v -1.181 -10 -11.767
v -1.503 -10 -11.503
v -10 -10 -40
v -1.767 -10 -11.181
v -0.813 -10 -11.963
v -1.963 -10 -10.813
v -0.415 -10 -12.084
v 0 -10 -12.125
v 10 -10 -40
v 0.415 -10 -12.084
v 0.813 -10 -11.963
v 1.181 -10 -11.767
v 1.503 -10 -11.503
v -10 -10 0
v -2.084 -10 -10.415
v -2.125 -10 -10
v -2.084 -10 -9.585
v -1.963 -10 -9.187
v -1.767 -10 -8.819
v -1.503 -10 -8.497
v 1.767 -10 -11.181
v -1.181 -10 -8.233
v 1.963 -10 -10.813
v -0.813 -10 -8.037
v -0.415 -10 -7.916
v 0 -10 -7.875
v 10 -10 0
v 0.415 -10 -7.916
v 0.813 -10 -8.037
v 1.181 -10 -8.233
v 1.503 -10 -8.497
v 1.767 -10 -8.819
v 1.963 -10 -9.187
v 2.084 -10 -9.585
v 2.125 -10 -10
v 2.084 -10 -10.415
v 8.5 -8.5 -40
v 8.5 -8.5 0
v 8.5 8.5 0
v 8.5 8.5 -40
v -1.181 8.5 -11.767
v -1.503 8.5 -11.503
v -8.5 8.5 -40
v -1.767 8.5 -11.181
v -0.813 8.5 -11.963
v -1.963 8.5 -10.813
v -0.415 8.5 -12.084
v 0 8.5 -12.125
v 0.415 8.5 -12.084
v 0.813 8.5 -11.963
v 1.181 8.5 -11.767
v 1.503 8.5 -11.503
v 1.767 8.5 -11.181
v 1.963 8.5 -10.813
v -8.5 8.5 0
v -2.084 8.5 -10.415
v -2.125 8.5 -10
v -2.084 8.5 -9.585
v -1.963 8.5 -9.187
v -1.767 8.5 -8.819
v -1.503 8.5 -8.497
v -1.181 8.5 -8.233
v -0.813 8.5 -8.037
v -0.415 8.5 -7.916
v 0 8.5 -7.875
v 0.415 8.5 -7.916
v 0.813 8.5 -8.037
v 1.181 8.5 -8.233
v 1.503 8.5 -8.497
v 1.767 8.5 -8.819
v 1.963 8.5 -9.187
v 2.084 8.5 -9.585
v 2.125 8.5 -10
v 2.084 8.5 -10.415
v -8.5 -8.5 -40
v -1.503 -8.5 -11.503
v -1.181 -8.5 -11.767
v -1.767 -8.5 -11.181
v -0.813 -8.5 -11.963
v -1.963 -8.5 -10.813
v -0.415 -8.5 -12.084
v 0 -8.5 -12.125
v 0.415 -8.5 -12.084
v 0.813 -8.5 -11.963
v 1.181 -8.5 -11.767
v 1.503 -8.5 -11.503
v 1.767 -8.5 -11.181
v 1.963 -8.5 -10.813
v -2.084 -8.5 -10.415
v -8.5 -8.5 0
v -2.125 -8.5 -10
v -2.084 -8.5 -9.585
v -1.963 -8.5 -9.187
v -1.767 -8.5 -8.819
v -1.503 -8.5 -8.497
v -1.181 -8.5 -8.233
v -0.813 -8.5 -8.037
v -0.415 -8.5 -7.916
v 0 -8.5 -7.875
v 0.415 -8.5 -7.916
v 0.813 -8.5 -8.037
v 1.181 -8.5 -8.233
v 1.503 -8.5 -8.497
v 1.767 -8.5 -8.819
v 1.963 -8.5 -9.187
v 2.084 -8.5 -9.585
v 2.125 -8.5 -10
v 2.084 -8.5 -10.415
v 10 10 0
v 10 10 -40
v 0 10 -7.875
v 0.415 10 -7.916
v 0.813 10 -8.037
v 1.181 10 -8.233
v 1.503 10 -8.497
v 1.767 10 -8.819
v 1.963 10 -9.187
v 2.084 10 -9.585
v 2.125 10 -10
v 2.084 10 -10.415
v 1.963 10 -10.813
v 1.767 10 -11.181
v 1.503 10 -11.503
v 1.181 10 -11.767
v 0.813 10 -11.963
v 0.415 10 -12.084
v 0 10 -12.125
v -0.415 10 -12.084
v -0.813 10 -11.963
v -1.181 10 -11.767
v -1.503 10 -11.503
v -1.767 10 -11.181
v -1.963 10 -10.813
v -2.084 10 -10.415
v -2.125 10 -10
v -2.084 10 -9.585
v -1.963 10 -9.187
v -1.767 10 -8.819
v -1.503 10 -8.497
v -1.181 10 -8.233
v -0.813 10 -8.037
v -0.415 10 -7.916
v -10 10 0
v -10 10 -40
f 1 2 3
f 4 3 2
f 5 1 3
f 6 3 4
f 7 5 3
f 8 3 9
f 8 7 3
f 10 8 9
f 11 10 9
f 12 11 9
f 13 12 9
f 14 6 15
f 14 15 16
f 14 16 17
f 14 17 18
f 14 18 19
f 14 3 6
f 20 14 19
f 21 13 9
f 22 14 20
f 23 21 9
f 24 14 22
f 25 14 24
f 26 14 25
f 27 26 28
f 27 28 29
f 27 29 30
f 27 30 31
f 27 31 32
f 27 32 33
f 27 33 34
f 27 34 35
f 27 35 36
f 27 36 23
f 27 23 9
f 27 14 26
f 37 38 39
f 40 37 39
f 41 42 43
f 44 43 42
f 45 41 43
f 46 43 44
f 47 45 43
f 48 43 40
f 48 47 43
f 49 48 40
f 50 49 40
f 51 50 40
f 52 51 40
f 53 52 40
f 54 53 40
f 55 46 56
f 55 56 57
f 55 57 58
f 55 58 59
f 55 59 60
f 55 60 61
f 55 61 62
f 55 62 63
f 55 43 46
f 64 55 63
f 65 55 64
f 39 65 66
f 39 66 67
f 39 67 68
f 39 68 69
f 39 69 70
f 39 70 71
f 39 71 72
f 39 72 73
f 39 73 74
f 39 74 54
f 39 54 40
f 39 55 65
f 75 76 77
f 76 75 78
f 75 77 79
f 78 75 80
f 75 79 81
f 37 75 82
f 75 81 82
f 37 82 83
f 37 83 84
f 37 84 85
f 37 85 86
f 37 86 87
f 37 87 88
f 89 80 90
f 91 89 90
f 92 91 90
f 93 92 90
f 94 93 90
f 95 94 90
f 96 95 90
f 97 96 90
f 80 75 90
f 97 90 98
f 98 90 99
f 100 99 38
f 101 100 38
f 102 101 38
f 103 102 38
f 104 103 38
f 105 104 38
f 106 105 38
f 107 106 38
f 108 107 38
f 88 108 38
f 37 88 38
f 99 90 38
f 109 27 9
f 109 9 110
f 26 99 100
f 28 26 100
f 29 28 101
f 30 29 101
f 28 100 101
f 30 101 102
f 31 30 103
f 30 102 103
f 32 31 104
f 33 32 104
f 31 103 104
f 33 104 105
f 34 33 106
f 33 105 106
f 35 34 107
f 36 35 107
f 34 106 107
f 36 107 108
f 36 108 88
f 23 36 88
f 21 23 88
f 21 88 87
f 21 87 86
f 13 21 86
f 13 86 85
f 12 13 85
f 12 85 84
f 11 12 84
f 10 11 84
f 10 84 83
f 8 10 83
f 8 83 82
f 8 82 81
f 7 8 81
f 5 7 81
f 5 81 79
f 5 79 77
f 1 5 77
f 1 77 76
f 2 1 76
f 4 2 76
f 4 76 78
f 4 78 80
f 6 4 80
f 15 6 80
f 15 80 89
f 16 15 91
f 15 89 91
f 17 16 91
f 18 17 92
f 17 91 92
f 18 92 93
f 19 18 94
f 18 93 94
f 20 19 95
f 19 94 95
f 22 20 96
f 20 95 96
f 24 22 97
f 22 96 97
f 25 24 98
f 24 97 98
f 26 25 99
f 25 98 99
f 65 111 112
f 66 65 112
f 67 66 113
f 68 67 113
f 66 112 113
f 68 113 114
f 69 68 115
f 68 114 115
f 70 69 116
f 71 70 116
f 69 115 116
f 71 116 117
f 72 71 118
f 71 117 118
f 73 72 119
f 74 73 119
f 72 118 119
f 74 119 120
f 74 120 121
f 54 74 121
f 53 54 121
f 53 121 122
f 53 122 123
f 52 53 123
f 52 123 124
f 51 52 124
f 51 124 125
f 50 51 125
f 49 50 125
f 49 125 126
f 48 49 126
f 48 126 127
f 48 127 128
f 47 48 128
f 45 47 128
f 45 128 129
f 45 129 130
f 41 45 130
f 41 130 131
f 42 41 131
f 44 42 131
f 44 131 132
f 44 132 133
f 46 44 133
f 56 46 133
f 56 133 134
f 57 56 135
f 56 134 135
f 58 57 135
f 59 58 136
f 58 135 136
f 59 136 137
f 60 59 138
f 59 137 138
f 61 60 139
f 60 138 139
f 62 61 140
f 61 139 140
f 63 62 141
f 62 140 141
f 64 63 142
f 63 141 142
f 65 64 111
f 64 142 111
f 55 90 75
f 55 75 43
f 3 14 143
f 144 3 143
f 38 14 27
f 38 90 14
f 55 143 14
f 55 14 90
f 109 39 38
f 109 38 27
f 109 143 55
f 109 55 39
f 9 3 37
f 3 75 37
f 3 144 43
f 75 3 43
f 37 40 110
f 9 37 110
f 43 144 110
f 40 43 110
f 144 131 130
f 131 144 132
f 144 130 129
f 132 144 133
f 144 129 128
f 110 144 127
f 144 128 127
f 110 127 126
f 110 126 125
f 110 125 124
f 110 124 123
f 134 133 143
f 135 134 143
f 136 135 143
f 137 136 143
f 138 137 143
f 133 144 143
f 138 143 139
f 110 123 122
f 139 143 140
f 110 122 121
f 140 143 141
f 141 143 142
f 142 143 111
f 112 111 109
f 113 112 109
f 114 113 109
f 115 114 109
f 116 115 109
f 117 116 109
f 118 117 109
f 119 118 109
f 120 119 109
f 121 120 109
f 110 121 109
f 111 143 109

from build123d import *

# Parameters (mm, degrees)
SKETCH1_W           = 20
SKETCH1_H           = 20
SKETCH1_W_2         = 17
SKETCH1_H_2         = 17
BOSS_EXTRUDE1_DEPTH = 40
SKETCH2_R           = 2.125
CUT_EXTRUDE1_DEPTH  = 46.82575695


with BuildPart() as part:
    # Sketch1 → Boss-Extrude1 (new body)
    with BuildSketch(Plane.XY):
        Rectangle(SKETCH1_W, SKETCH1_H)
        Rectangle(SKETCH1_W_2, SKETCH1_H_2, mode=Mode.SUBTRACT)
    extrude(amount=-BOSS_EXTRUDE1_DEPTH)

    # Sketch2 → Cut-Extrude1 (cut, through all)
    with BuildSketch(Plane(origin=(0, 10, 0), x_dir=(1, 0, 0), z_dir=(0, 1, 0))):
        with Locations(Location((0, 10, 0), (0, 0, 270))):
            Circle(SKETCH2_R)
        with Locations((0, 80)):
            Circle(SKETCH2_R)
        with Locations((0, 150)):
            Circle(SKETCH2_R)
    extrude(amount=-CUT_EXTRUDE1_DEPTH, mode=Mode.SUBTRACT)


solid = part.part
